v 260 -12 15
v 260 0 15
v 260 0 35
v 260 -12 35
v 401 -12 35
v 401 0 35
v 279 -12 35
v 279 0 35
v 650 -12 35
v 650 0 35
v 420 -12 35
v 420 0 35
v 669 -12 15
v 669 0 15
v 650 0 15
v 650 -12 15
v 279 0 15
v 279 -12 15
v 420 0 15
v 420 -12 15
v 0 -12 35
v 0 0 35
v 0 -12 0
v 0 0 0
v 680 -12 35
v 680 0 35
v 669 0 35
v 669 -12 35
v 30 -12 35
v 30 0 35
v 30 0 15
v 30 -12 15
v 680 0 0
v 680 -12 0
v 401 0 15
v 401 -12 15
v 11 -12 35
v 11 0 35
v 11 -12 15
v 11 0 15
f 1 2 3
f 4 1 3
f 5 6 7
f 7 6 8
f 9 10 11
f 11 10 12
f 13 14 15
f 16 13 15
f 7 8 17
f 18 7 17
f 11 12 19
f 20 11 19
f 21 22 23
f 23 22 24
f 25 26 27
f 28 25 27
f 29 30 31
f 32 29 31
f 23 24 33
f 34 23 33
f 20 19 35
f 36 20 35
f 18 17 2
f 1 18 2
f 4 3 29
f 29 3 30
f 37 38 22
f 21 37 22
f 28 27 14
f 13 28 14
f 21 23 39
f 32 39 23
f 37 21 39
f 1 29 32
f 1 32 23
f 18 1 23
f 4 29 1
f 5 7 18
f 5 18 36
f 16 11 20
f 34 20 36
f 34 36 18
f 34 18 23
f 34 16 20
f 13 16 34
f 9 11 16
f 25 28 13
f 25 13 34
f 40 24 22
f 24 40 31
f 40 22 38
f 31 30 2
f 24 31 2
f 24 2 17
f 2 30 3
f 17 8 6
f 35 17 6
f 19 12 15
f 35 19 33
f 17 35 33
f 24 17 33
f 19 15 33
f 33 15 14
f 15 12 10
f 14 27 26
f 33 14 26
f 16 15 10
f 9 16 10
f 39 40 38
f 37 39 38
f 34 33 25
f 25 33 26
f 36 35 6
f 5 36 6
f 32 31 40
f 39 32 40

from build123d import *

# Parameters (mm, degrees)
F1_DEPTH = 12


# Not quite as in the source:
# - a feature names something its author has since deleted; it is built from what else it names


with BuildPart() as f1:
    # F0 (on Front) → F1 (new body)
    with BuildSketch(Plane.XZ):
        Polygon((0, 35), (0, 0), (680, 0), (680, 35), (669, 35), (669, 15), (650, 15), (650, 35), (420, 35), (420, 15), (401, 15), (401, 35), (279, 35), (279, 15), (260, 15), (260, 35), (30, 35), (30, 15), (11, 15), (11, 35), align=None)
    extrude(amount=F1_DEPTH)


solid = f1.part
